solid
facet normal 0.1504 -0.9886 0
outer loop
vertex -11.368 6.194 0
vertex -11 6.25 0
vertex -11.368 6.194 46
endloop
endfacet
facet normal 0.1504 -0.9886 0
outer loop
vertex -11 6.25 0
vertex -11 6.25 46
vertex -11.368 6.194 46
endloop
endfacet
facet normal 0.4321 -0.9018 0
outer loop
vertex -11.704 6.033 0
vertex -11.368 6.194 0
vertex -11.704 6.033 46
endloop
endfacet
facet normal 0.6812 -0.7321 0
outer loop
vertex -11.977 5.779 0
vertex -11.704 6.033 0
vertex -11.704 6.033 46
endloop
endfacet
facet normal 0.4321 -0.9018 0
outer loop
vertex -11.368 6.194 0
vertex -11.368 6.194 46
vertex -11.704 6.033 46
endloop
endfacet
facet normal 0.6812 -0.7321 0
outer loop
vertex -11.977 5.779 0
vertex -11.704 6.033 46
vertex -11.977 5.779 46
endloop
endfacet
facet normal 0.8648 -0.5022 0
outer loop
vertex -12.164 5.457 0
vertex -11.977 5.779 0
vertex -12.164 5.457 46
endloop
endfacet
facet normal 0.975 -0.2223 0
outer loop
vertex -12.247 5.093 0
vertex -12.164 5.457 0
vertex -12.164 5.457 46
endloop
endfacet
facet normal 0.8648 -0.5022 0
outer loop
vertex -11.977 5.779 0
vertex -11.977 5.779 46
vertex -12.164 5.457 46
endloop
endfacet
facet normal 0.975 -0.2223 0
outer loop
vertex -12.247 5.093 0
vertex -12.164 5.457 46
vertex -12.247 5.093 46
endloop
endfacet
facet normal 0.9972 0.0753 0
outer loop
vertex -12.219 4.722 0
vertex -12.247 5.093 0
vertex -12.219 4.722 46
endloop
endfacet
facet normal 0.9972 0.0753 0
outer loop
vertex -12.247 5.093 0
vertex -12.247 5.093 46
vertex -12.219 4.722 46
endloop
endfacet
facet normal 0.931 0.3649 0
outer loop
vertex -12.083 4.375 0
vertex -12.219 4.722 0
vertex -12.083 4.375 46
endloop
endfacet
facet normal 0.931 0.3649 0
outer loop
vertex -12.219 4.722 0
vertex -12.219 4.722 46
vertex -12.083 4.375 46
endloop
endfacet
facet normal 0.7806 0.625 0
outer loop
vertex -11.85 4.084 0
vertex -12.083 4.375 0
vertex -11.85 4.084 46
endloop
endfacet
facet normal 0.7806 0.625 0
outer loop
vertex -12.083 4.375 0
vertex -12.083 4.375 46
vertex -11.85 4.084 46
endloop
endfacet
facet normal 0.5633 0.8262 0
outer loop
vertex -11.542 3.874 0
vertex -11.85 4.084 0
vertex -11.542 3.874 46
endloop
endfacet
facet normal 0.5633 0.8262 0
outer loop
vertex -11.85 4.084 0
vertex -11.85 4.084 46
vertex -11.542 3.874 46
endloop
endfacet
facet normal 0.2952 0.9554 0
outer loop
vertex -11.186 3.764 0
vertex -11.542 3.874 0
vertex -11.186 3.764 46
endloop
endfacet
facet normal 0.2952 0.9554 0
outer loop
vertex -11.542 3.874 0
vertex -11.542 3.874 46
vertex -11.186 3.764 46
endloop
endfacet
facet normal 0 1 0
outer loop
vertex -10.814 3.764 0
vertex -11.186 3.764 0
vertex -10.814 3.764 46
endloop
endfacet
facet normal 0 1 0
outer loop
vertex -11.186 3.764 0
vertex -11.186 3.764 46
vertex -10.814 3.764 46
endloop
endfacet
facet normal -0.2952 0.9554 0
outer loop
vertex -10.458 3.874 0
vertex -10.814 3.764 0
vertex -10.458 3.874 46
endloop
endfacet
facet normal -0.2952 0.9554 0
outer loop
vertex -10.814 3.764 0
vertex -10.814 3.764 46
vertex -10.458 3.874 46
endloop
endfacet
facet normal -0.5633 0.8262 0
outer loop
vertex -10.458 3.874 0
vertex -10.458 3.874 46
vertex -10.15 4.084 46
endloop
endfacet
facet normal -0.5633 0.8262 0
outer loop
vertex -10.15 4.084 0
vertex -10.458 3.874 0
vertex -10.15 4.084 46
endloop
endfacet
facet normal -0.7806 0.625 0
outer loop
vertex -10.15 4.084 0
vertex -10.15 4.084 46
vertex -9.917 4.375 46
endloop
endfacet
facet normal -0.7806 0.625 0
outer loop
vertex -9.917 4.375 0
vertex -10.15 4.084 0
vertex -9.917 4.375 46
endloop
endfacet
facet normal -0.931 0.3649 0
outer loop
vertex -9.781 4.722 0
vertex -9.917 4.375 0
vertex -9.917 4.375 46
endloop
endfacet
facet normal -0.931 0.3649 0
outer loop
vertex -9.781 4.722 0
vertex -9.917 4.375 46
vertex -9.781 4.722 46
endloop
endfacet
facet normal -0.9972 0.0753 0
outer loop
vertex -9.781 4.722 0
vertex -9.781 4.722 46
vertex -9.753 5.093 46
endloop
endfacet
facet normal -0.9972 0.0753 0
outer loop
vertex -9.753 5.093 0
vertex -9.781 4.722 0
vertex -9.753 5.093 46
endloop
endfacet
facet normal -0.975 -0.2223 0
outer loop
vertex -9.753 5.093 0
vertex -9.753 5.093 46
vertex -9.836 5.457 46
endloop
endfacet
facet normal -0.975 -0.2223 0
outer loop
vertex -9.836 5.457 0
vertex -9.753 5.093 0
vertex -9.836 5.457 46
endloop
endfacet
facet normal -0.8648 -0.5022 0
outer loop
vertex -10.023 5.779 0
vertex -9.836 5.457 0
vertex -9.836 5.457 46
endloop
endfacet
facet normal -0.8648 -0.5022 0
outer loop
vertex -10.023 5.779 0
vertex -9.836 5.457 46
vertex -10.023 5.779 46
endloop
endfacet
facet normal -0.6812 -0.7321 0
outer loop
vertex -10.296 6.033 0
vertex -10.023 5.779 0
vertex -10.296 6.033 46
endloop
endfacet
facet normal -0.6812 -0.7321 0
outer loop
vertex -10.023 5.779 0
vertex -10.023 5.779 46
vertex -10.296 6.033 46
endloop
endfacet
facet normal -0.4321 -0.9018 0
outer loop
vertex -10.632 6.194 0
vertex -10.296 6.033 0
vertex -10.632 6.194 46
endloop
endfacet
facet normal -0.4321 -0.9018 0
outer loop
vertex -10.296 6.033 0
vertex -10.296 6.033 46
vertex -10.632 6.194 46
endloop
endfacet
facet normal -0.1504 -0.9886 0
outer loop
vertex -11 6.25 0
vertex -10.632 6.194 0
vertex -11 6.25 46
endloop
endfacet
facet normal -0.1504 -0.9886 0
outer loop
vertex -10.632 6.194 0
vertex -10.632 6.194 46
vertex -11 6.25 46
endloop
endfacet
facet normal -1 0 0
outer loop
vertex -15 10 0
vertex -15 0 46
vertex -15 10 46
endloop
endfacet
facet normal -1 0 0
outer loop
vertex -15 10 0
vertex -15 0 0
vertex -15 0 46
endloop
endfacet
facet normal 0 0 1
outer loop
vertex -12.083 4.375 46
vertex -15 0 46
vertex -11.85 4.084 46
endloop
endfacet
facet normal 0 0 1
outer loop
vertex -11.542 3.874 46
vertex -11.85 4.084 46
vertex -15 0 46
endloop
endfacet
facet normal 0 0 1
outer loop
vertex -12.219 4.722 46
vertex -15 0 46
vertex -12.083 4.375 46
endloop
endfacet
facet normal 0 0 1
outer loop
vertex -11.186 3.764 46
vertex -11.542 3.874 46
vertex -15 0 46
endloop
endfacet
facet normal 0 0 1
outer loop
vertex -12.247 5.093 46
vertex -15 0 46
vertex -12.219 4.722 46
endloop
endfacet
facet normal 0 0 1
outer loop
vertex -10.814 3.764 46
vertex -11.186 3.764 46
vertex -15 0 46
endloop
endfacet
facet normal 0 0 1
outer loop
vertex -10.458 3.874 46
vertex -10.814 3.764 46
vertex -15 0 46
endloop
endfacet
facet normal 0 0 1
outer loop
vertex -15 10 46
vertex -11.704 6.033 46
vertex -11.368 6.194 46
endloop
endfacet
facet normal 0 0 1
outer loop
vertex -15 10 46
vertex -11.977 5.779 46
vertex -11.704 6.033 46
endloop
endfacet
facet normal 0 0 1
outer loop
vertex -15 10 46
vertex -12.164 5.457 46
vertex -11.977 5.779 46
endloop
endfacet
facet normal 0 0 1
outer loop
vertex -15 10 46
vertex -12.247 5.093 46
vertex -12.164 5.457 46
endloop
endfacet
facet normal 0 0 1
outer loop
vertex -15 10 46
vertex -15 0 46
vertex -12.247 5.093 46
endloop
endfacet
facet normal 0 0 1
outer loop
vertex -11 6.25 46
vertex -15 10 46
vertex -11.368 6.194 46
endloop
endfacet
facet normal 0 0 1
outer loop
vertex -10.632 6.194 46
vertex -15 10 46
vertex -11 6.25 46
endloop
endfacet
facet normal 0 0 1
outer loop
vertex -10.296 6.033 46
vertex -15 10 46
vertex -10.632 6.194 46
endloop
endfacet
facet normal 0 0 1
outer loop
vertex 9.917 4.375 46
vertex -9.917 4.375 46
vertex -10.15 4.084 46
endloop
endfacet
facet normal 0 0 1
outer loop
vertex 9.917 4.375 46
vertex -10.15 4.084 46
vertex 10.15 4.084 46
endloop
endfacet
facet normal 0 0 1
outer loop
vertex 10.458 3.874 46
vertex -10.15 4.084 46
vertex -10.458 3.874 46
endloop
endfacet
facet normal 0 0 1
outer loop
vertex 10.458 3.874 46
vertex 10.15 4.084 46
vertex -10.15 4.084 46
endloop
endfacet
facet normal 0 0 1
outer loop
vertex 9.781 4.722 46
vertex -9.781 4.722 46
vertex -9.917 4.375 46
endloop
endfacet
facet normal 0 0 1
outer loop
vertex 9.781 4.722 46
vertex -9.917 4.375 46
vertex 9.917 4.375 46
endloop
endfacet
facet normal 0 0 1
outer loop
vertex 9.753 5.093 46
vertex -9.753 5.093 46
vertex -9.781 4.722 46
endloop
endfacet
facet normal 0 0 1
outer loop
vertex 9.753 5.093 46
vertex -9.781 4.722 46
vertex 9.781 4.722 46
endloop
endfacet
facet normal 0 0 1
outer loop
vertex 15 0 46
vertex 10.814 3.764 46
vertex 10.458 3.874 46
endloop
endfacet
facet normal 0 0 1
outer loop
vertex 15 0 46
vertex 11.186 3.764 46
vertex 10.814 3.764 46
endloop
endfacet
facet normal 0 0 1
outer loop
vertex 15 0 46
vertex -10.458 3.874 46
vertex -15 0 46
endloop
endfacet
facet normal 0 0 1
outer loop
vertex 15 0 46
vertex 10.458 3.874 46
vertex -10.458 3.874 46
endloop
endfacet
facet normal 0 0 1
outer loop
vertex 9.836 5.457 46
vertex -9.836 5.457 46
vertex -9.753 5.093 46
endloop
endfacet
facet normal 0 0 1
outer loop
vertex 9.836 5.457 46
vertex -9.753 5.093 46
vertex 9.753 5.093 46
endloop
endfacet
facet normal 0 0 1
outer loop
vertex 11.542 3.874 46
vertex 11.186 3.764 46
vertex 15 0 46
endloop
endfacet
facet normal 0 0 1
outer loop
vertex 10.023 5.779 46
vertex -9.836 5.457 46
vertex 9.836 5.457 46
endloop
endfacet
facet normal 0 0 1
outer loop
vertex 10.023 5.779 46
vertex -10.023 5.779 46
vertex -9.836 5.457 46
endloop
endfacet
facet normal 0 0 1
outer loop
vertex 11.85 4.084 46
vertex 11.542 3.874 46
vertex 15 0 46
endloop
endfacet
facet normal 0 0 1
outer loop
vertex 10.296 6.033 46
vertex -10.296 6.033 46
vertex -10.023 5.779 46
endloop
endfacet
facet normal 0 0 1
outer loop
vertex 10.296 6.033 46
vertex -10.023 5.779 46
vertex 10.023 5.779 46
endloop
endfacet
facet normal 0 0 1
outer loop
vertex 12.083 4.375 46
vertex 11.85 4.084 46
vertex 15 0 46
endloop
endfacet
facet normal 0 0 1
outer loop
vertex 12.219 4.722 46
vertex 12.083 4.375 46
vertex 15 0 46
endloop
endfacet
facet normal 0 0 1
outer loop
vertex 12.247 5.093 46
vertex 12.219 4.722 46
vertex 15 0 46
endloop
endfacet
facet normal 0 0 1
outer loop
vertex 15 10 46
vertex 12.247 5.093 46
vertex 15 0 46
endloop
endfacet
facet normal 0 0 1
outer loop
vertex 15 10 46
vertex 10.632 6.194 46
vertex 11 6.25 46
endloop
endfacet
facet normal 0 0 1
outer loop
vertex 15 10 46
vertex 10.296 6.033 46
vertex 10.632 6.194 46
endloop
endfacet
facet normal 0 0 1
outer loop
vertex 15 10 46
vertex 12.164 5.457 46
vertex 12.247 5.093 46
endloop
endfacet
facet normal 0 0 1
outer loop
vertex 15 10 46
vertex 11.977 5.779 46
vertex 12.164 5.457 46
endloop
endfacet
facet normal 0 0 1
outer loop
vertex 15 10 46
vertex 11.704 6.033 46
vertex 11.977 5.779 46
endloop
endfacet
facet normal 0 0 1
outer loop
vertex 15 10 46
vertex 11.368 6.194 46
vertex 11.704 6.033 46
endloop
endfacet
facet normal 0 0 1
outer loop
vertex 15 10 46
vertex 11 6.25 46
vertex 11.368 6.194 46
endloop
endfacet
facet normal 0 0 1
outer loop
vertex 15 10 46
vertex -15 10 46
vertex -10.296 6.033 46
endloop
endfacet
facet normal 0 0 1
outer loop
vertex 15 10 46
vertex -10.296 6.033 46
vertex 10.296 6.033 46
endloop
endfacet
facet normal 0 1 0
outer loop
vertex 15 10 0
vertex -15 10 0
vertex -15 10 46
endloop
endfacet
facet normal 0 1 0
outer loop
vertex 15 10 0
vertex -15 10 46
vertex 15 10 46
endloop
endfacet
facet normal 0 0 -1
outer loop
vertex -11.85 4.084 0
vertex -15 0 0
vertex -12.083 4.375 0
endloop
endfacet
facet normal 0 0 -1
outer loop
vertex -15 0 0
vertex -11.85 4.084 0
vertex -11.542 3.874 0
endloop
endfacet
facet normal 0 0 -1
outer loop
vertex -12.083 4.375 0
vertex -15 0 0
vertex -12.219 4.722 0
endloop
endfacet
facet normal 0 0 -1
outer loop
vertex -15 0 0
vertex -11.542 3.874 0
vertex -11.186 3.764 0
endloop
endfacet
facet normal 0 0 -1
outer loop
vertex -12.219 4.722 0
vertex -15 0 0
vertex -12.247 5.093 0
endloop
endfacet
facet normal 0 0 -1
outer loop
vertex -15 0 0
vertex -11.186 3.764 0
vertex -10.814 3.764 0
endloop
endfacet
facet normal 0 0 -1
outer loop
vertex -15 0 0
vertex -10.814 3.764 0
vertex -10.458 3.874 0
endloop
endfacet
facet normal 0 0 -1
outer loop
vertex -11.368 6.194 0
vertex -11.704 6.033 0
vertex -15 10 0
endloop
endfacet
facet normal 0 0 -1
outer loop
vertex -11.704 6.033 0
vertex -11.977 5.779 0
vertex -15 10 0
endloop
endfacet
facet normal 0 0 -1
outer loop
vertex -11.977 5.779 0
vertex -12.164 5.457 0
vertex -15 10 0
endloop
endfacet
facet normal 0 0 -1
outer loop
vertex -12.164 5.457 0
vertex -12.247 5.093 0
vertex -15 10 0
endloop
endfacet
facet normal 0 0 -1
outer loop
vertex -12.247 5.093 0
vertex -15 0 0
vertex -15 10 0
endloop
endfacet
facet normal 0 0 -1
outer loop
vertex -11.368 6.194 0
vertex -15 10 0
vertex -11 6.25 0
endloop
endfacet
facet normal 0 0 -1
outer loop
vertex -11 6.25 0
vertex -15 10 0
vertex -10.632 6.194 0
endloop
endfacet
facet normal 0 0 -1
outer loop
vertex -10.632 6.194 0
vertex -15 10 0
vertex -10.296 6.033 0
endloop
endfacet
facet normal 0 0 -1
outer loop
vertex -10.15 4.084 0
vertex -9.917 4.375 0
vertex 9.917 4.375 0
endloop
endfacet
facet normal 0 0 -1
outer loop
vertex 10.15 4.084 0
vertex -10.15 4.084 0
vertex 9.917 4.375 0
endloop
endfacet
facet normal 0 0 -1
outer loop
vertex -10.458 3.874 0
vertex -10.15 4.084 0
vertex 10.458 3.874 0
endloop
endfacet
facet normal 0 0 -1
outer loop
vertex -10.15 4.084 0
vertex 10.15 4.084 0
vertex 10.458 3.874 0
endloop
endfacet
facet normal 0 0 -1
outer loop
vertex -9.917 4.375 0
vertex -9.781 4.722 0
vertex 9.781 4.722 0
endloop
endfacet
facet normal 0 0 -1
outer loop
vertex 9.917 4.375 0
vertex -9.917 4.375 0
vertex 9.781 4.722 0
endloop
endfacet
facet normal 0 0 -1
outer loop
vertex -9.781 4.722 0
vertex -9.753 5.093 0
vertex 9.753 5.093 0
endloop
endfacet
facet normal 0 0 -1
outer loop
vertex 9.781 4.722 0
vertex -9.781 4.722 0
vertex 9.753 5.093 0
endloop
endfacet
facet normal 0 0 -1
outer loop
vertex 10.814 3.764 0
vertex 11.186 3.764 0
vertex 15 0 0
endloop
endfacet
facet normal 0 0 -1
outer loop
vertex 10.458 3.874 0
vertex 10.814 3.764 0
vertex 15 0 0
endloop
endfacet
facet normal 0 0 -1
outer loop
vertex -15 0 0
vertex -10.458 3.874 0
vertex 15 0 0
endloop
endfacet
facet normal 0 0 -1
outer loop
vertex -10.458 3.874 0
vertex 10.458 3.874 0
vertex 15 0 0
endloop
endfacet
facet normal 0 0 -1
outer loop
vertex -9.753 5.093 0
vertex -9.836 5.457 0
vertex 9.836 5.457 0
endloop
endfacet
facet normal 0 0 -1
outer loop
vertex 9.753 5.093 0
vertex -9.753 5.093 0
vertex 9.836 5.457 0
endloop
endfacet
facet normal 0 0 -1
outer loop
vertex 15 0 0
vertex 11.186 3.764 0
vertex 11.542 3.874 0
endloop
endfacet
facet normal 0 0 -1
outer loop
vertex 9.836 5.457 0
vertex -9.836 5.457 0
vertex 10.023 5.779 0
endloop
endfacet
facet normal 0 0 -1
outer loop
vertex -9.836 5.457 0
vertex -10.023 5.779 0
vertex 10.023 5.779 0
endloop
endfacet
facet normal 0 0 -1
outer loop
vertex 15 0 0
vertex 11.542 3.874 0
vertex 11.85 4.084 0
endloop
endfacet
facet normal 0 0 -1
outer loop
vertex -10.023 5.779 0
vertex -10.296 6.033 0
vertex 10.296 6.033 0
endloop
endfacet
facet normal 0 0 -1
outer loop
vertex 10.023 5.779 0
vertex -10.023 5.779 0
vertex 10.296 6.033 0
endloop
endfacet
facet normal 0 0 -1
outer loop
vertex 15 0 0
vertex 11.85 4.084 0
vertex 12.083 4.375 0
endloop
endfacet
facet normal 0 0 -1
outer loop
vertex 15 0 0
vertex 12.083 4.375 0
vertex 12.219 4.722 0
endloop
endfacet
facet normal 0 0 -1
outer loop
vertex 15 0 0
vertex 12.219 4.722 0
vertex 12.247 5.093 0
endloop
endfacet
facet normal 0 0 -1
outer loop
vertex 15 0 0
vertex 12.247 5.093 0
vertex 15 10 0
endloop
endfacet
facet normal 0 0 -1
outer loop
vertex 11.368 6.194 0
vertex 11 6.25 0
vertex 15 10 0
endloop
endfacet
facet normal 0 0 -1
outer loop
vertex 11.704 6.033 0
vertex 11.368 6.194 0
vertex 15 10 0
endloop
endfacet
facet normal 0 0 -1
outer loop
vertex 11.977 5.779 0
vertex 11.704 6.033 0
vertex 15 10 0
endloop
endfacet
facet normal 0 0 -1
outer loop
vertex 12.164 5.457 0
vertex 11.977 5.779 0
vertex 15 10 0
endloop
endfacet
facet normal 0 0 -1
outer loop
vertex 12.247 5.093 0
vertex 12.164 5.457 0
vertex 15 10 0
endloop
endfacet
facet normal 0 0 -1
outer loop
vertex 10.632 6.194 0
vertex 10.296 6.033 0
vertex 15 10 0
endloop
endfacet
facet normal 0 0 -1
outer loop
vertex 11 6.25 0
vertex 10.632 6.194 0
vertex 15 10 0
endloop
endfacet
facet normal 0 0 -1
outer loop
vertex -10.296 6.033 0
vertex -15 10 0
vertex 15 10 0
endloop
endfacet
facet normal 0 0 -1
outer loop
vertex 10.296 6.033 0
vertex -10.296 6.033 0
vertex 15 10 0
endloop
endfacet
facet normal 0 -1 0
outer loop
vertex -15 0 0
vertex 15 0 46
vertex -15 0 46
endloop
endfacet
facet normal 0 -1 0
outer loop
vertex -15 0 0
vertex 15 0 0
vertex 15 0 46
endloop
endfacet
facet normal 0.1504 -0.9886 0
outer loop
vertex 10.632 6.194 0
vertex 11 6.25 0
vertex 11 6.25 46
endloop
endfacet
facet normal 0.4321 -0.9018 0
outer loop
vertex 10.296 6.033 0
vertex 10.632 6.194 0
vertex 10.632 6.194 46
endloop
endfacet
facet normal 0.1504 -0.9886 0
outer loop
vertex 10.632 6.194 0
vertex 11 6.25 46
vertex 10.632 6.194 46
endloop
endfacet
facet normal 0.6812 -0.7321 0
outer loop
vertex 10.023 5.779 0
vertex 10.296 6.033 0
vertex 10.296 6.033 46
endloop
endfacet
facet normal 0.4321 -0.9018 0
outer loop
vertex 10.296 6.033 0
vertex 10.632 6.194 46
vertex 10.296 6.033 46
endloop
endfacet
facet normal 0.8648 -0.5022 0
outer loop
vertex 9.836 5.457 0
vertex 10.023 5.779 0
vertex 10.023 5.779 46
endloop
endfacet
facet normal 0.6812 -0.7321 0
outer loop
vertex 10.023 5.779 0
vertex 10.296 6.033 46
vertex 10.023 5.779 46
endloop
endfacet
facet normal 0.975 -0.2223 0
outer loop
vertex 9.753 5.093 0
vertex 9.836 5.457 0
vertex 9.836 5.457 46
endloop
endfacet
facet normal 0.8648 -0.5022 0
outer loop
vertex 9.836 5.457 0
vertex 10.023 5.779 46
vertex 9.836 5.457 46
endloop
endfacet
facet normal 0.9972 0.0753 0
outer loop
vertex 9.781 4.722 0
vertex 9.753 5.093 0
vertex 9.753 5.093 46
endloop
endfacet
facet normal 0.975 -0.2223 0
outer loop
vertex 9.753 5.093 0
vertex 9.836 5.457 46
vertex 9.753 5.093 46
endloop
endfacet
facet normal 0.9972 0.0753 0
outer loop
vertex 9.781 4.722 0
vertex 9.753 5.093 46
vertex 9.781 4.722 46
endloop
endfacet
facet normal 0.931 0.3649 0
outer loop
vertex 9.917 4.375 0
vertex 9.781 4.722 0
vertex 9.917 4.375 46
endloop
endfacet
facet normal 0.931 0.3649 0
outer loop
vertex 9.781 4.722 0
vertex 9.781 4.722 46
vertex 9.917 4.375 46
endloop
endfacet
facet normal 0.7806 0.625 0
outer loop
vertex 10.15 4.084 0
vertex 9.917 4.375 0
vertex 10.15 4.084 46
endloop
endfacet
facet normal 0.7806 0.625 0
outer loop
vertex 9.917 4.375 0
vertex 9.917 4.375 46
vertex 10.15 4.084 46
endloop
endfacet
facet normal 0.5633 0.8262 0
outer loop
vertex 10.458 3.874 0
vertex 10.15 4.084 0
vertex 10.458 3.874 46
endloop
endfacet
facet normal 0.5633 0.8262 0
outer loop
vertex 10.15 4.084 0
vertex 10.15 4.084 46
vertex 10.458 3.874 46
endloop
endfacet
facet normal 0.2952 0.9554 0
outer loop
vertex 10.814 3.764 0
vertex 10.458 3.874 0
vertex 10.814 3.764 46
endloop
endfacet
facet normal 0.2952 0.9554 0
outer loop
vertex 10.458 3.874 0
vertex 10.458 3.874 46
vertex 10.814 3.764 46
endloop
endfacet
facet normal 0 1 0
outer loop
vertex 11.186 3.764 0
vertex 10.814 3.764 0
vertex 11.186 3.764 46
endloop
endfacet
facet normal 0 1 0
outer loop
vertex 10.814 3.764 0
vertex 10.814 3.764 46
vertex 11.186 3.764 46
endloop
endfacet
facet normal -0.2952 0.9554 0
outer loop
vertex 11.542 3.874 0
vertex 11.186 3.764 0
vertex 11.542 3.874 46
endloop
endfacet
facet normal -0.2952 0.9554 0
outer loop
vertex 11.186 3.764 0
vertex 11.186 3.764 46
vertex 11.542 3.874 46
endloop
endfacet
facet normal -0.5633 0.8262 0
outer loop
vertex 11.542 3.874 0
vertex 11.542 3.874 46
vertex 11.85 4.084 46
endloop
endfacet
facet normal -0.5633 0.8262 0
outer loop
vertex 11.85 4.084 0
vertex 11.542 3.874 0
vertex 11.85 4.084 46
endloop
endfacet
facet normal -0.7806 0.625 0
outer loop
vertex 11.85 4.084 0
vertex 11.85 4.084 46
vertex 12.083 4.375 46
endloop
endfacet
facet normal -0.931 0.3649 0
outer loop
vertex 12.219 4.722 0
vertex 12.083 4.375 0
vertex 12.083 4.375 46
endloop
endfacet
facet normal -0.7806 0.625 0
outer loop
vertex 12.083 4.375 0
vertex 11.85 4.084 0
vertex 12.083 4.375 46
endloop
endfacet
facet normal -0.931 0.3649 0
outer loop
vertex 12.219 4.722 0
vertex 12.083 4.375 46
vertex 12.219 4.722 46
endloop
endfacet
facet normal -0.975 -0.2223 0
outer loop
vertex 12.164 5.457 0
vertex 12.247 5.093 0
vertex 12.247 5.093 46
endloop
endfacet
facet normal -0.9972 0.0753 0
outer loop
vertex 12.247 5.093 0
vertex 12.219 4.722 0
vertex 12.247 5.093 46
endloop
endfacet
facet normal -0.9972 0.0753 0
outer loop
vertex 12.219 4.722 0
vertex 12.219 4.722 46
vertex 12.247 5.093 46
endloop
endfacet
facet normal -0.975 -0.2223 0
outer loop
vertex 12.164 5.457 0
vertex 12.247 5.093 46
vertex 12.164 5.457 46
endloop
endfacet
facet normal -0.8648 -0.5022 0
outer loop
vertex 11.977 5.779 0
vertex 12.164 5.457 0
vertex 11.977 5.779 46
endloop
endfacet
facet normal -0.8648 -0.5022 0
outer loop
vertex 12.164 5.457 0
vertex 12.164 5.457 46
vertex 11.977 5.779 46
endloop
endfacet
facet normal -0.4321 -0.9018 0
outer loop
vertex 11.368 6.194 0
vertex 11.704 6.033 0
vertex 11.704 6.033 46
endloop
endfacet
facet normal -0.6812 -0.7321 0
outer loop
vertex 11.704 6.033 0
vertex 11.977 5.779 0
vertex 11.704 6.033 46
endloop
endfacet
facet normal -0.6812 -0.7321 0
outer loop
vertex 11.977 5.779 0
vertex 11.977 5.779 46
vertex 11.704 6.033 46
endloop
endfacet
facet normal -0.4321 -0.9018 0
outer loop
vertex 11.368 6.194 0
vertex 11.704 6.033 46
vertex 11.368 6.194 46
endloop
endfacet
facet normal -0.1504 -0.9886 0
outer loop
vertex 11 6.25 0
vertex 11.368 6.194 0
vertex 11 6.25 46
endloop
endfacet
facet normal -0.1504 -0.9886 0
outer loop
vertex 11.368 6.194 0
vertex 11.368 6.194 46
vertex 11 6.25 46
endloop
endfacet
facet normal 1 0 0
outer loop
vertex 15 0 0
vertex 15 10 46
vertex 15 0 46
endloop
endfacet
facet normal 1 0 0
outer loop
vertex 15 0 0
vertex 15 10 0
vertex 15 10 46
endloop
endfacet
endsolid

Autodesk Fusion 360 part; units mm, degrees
sketch "Esquisse1" plane through (0, 0, 0) normal (0, 0, 1) x (1, 0, 0)
  line L0 (-15, 10) -> (15, 10)
  line L1 (15, 10) -> (15, 0)
  line L2 (15, 0) -> (-15, 0)
  line L3 (-15, 0) -> (-15, 10)
  line L4 (0, 1.75) -> (0, 22.5)
  dimension "d1" = 30
  dimension "d2" = 10
extrude "Extrusion1" add sketch "Esquisse1" along normal blind 46
sketch "Esquisse2" plane through (0, 0, 0) normal (0, 0, -1) x (1, 0, 0)
  line L0 (15, 0) -> (-15, 0)
  line L1 (-15, 0) -> (-15, -10)
  line L2 (-15, -10) -> (15, -10)
  line L3 (15, -10) -> (15, 0)
  point P0 (-11, -5)
  dimension "d5" = 11
  dimension "d6" = 5
hole "Perçage1" at (-11, 5, 0) direction (0, 0, 1) diameter 2.5 depth 57 tip angle 118
mirror "Symétrie miroir1" about plane through (0, 0, 0) normal (1, 0, 0) of "Perçage1"
